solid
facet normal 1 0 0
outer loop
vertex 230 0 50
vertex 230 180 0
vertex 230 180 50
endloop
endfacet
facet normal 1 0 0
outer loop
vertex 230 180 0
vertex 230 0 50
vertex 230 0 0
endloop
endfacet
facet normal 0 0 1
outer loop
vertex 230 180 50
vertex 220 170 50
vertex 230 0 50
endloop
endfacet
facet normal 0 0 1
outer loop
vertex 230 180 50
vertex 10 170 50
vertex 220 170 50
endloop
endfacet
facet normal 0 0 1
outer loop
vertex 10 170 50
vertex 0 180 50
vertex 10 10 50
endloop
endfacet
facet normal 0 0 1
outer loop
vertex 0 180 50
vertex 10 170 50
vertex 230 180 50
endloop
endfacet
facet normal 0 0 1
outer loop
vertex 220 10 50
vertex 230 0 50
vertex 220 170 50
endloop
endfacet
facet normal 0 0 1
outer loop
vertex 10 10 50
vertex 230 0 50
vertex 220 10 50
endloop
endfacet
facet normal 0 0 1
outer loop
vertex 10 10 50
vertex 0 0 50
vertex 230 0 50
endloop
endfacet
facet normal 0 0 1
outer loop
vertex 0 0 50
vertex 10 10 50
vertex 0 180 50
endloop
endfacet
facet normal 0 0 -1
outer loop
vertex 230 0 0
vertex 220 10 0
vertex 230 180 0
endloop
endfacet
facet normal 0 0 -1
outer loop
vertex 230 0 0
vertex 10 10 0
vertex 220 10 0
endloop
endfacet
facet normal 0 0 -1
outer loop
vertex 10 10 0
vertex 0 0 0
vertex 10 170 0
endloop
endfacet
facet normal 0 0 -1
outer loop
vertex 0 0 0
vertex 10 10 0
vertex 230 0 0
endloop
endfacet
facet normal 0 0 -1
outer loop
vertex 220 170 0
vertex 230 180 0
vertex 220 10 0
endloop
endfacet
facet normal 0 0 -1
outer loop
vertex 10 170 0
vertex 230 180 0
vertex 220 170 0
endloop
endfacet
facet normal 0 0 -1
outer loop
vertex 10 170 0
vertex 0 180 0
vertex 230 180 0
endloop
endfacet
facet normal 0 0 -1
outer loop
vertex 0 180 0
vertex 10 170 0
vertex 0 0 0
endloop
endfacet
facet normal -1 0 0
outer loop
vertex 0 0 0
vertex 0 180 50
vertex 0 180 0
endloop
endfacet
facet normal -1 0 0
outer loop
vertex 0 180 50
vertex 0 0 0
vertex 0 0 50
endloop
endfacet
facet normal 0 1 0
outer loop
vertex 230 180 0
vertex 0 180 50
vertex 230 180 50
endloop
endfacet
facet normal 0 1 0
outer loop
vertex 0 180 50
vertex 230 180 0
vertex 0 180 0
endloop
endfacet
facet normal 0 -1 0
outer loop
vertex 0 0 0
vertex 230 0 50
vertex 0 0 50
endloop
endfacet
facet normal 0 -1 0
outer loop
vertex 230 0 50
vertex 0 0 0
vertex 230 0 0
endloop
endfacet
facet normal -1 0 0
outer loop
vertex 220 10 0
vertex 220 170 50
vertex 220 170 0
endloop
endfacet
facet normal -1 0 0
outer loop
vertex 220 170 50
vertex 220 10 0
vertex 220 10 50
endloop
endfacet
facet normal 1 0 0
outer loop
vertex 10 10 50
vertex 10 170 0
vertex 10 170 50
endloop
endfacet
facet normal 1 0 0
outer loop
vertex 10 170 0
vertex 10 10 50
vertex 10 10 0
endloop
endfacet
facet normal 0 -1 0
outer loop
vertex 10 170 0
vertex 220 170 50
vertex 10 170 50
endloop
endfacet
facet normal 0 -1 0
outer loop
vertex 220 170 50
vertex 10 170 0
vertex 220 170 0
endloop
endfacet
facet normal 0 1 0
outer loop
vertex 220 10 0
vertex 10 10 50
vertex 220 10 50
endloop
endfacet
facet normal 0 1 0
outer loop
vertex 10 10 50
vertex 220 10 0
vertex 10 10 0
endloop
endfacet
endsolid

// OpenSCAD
InnerX=210;
InnerY=160;
Height=50;
Wall=20;
Buffer=5;
difference()
{
  cube([InnerX+Wall,InnerY+Wall,Height]);
  translate([Wall/2,Wall/2,-Buffer]) cube([InnerX,InnerY,Height+(Buffer*2)]);
}
